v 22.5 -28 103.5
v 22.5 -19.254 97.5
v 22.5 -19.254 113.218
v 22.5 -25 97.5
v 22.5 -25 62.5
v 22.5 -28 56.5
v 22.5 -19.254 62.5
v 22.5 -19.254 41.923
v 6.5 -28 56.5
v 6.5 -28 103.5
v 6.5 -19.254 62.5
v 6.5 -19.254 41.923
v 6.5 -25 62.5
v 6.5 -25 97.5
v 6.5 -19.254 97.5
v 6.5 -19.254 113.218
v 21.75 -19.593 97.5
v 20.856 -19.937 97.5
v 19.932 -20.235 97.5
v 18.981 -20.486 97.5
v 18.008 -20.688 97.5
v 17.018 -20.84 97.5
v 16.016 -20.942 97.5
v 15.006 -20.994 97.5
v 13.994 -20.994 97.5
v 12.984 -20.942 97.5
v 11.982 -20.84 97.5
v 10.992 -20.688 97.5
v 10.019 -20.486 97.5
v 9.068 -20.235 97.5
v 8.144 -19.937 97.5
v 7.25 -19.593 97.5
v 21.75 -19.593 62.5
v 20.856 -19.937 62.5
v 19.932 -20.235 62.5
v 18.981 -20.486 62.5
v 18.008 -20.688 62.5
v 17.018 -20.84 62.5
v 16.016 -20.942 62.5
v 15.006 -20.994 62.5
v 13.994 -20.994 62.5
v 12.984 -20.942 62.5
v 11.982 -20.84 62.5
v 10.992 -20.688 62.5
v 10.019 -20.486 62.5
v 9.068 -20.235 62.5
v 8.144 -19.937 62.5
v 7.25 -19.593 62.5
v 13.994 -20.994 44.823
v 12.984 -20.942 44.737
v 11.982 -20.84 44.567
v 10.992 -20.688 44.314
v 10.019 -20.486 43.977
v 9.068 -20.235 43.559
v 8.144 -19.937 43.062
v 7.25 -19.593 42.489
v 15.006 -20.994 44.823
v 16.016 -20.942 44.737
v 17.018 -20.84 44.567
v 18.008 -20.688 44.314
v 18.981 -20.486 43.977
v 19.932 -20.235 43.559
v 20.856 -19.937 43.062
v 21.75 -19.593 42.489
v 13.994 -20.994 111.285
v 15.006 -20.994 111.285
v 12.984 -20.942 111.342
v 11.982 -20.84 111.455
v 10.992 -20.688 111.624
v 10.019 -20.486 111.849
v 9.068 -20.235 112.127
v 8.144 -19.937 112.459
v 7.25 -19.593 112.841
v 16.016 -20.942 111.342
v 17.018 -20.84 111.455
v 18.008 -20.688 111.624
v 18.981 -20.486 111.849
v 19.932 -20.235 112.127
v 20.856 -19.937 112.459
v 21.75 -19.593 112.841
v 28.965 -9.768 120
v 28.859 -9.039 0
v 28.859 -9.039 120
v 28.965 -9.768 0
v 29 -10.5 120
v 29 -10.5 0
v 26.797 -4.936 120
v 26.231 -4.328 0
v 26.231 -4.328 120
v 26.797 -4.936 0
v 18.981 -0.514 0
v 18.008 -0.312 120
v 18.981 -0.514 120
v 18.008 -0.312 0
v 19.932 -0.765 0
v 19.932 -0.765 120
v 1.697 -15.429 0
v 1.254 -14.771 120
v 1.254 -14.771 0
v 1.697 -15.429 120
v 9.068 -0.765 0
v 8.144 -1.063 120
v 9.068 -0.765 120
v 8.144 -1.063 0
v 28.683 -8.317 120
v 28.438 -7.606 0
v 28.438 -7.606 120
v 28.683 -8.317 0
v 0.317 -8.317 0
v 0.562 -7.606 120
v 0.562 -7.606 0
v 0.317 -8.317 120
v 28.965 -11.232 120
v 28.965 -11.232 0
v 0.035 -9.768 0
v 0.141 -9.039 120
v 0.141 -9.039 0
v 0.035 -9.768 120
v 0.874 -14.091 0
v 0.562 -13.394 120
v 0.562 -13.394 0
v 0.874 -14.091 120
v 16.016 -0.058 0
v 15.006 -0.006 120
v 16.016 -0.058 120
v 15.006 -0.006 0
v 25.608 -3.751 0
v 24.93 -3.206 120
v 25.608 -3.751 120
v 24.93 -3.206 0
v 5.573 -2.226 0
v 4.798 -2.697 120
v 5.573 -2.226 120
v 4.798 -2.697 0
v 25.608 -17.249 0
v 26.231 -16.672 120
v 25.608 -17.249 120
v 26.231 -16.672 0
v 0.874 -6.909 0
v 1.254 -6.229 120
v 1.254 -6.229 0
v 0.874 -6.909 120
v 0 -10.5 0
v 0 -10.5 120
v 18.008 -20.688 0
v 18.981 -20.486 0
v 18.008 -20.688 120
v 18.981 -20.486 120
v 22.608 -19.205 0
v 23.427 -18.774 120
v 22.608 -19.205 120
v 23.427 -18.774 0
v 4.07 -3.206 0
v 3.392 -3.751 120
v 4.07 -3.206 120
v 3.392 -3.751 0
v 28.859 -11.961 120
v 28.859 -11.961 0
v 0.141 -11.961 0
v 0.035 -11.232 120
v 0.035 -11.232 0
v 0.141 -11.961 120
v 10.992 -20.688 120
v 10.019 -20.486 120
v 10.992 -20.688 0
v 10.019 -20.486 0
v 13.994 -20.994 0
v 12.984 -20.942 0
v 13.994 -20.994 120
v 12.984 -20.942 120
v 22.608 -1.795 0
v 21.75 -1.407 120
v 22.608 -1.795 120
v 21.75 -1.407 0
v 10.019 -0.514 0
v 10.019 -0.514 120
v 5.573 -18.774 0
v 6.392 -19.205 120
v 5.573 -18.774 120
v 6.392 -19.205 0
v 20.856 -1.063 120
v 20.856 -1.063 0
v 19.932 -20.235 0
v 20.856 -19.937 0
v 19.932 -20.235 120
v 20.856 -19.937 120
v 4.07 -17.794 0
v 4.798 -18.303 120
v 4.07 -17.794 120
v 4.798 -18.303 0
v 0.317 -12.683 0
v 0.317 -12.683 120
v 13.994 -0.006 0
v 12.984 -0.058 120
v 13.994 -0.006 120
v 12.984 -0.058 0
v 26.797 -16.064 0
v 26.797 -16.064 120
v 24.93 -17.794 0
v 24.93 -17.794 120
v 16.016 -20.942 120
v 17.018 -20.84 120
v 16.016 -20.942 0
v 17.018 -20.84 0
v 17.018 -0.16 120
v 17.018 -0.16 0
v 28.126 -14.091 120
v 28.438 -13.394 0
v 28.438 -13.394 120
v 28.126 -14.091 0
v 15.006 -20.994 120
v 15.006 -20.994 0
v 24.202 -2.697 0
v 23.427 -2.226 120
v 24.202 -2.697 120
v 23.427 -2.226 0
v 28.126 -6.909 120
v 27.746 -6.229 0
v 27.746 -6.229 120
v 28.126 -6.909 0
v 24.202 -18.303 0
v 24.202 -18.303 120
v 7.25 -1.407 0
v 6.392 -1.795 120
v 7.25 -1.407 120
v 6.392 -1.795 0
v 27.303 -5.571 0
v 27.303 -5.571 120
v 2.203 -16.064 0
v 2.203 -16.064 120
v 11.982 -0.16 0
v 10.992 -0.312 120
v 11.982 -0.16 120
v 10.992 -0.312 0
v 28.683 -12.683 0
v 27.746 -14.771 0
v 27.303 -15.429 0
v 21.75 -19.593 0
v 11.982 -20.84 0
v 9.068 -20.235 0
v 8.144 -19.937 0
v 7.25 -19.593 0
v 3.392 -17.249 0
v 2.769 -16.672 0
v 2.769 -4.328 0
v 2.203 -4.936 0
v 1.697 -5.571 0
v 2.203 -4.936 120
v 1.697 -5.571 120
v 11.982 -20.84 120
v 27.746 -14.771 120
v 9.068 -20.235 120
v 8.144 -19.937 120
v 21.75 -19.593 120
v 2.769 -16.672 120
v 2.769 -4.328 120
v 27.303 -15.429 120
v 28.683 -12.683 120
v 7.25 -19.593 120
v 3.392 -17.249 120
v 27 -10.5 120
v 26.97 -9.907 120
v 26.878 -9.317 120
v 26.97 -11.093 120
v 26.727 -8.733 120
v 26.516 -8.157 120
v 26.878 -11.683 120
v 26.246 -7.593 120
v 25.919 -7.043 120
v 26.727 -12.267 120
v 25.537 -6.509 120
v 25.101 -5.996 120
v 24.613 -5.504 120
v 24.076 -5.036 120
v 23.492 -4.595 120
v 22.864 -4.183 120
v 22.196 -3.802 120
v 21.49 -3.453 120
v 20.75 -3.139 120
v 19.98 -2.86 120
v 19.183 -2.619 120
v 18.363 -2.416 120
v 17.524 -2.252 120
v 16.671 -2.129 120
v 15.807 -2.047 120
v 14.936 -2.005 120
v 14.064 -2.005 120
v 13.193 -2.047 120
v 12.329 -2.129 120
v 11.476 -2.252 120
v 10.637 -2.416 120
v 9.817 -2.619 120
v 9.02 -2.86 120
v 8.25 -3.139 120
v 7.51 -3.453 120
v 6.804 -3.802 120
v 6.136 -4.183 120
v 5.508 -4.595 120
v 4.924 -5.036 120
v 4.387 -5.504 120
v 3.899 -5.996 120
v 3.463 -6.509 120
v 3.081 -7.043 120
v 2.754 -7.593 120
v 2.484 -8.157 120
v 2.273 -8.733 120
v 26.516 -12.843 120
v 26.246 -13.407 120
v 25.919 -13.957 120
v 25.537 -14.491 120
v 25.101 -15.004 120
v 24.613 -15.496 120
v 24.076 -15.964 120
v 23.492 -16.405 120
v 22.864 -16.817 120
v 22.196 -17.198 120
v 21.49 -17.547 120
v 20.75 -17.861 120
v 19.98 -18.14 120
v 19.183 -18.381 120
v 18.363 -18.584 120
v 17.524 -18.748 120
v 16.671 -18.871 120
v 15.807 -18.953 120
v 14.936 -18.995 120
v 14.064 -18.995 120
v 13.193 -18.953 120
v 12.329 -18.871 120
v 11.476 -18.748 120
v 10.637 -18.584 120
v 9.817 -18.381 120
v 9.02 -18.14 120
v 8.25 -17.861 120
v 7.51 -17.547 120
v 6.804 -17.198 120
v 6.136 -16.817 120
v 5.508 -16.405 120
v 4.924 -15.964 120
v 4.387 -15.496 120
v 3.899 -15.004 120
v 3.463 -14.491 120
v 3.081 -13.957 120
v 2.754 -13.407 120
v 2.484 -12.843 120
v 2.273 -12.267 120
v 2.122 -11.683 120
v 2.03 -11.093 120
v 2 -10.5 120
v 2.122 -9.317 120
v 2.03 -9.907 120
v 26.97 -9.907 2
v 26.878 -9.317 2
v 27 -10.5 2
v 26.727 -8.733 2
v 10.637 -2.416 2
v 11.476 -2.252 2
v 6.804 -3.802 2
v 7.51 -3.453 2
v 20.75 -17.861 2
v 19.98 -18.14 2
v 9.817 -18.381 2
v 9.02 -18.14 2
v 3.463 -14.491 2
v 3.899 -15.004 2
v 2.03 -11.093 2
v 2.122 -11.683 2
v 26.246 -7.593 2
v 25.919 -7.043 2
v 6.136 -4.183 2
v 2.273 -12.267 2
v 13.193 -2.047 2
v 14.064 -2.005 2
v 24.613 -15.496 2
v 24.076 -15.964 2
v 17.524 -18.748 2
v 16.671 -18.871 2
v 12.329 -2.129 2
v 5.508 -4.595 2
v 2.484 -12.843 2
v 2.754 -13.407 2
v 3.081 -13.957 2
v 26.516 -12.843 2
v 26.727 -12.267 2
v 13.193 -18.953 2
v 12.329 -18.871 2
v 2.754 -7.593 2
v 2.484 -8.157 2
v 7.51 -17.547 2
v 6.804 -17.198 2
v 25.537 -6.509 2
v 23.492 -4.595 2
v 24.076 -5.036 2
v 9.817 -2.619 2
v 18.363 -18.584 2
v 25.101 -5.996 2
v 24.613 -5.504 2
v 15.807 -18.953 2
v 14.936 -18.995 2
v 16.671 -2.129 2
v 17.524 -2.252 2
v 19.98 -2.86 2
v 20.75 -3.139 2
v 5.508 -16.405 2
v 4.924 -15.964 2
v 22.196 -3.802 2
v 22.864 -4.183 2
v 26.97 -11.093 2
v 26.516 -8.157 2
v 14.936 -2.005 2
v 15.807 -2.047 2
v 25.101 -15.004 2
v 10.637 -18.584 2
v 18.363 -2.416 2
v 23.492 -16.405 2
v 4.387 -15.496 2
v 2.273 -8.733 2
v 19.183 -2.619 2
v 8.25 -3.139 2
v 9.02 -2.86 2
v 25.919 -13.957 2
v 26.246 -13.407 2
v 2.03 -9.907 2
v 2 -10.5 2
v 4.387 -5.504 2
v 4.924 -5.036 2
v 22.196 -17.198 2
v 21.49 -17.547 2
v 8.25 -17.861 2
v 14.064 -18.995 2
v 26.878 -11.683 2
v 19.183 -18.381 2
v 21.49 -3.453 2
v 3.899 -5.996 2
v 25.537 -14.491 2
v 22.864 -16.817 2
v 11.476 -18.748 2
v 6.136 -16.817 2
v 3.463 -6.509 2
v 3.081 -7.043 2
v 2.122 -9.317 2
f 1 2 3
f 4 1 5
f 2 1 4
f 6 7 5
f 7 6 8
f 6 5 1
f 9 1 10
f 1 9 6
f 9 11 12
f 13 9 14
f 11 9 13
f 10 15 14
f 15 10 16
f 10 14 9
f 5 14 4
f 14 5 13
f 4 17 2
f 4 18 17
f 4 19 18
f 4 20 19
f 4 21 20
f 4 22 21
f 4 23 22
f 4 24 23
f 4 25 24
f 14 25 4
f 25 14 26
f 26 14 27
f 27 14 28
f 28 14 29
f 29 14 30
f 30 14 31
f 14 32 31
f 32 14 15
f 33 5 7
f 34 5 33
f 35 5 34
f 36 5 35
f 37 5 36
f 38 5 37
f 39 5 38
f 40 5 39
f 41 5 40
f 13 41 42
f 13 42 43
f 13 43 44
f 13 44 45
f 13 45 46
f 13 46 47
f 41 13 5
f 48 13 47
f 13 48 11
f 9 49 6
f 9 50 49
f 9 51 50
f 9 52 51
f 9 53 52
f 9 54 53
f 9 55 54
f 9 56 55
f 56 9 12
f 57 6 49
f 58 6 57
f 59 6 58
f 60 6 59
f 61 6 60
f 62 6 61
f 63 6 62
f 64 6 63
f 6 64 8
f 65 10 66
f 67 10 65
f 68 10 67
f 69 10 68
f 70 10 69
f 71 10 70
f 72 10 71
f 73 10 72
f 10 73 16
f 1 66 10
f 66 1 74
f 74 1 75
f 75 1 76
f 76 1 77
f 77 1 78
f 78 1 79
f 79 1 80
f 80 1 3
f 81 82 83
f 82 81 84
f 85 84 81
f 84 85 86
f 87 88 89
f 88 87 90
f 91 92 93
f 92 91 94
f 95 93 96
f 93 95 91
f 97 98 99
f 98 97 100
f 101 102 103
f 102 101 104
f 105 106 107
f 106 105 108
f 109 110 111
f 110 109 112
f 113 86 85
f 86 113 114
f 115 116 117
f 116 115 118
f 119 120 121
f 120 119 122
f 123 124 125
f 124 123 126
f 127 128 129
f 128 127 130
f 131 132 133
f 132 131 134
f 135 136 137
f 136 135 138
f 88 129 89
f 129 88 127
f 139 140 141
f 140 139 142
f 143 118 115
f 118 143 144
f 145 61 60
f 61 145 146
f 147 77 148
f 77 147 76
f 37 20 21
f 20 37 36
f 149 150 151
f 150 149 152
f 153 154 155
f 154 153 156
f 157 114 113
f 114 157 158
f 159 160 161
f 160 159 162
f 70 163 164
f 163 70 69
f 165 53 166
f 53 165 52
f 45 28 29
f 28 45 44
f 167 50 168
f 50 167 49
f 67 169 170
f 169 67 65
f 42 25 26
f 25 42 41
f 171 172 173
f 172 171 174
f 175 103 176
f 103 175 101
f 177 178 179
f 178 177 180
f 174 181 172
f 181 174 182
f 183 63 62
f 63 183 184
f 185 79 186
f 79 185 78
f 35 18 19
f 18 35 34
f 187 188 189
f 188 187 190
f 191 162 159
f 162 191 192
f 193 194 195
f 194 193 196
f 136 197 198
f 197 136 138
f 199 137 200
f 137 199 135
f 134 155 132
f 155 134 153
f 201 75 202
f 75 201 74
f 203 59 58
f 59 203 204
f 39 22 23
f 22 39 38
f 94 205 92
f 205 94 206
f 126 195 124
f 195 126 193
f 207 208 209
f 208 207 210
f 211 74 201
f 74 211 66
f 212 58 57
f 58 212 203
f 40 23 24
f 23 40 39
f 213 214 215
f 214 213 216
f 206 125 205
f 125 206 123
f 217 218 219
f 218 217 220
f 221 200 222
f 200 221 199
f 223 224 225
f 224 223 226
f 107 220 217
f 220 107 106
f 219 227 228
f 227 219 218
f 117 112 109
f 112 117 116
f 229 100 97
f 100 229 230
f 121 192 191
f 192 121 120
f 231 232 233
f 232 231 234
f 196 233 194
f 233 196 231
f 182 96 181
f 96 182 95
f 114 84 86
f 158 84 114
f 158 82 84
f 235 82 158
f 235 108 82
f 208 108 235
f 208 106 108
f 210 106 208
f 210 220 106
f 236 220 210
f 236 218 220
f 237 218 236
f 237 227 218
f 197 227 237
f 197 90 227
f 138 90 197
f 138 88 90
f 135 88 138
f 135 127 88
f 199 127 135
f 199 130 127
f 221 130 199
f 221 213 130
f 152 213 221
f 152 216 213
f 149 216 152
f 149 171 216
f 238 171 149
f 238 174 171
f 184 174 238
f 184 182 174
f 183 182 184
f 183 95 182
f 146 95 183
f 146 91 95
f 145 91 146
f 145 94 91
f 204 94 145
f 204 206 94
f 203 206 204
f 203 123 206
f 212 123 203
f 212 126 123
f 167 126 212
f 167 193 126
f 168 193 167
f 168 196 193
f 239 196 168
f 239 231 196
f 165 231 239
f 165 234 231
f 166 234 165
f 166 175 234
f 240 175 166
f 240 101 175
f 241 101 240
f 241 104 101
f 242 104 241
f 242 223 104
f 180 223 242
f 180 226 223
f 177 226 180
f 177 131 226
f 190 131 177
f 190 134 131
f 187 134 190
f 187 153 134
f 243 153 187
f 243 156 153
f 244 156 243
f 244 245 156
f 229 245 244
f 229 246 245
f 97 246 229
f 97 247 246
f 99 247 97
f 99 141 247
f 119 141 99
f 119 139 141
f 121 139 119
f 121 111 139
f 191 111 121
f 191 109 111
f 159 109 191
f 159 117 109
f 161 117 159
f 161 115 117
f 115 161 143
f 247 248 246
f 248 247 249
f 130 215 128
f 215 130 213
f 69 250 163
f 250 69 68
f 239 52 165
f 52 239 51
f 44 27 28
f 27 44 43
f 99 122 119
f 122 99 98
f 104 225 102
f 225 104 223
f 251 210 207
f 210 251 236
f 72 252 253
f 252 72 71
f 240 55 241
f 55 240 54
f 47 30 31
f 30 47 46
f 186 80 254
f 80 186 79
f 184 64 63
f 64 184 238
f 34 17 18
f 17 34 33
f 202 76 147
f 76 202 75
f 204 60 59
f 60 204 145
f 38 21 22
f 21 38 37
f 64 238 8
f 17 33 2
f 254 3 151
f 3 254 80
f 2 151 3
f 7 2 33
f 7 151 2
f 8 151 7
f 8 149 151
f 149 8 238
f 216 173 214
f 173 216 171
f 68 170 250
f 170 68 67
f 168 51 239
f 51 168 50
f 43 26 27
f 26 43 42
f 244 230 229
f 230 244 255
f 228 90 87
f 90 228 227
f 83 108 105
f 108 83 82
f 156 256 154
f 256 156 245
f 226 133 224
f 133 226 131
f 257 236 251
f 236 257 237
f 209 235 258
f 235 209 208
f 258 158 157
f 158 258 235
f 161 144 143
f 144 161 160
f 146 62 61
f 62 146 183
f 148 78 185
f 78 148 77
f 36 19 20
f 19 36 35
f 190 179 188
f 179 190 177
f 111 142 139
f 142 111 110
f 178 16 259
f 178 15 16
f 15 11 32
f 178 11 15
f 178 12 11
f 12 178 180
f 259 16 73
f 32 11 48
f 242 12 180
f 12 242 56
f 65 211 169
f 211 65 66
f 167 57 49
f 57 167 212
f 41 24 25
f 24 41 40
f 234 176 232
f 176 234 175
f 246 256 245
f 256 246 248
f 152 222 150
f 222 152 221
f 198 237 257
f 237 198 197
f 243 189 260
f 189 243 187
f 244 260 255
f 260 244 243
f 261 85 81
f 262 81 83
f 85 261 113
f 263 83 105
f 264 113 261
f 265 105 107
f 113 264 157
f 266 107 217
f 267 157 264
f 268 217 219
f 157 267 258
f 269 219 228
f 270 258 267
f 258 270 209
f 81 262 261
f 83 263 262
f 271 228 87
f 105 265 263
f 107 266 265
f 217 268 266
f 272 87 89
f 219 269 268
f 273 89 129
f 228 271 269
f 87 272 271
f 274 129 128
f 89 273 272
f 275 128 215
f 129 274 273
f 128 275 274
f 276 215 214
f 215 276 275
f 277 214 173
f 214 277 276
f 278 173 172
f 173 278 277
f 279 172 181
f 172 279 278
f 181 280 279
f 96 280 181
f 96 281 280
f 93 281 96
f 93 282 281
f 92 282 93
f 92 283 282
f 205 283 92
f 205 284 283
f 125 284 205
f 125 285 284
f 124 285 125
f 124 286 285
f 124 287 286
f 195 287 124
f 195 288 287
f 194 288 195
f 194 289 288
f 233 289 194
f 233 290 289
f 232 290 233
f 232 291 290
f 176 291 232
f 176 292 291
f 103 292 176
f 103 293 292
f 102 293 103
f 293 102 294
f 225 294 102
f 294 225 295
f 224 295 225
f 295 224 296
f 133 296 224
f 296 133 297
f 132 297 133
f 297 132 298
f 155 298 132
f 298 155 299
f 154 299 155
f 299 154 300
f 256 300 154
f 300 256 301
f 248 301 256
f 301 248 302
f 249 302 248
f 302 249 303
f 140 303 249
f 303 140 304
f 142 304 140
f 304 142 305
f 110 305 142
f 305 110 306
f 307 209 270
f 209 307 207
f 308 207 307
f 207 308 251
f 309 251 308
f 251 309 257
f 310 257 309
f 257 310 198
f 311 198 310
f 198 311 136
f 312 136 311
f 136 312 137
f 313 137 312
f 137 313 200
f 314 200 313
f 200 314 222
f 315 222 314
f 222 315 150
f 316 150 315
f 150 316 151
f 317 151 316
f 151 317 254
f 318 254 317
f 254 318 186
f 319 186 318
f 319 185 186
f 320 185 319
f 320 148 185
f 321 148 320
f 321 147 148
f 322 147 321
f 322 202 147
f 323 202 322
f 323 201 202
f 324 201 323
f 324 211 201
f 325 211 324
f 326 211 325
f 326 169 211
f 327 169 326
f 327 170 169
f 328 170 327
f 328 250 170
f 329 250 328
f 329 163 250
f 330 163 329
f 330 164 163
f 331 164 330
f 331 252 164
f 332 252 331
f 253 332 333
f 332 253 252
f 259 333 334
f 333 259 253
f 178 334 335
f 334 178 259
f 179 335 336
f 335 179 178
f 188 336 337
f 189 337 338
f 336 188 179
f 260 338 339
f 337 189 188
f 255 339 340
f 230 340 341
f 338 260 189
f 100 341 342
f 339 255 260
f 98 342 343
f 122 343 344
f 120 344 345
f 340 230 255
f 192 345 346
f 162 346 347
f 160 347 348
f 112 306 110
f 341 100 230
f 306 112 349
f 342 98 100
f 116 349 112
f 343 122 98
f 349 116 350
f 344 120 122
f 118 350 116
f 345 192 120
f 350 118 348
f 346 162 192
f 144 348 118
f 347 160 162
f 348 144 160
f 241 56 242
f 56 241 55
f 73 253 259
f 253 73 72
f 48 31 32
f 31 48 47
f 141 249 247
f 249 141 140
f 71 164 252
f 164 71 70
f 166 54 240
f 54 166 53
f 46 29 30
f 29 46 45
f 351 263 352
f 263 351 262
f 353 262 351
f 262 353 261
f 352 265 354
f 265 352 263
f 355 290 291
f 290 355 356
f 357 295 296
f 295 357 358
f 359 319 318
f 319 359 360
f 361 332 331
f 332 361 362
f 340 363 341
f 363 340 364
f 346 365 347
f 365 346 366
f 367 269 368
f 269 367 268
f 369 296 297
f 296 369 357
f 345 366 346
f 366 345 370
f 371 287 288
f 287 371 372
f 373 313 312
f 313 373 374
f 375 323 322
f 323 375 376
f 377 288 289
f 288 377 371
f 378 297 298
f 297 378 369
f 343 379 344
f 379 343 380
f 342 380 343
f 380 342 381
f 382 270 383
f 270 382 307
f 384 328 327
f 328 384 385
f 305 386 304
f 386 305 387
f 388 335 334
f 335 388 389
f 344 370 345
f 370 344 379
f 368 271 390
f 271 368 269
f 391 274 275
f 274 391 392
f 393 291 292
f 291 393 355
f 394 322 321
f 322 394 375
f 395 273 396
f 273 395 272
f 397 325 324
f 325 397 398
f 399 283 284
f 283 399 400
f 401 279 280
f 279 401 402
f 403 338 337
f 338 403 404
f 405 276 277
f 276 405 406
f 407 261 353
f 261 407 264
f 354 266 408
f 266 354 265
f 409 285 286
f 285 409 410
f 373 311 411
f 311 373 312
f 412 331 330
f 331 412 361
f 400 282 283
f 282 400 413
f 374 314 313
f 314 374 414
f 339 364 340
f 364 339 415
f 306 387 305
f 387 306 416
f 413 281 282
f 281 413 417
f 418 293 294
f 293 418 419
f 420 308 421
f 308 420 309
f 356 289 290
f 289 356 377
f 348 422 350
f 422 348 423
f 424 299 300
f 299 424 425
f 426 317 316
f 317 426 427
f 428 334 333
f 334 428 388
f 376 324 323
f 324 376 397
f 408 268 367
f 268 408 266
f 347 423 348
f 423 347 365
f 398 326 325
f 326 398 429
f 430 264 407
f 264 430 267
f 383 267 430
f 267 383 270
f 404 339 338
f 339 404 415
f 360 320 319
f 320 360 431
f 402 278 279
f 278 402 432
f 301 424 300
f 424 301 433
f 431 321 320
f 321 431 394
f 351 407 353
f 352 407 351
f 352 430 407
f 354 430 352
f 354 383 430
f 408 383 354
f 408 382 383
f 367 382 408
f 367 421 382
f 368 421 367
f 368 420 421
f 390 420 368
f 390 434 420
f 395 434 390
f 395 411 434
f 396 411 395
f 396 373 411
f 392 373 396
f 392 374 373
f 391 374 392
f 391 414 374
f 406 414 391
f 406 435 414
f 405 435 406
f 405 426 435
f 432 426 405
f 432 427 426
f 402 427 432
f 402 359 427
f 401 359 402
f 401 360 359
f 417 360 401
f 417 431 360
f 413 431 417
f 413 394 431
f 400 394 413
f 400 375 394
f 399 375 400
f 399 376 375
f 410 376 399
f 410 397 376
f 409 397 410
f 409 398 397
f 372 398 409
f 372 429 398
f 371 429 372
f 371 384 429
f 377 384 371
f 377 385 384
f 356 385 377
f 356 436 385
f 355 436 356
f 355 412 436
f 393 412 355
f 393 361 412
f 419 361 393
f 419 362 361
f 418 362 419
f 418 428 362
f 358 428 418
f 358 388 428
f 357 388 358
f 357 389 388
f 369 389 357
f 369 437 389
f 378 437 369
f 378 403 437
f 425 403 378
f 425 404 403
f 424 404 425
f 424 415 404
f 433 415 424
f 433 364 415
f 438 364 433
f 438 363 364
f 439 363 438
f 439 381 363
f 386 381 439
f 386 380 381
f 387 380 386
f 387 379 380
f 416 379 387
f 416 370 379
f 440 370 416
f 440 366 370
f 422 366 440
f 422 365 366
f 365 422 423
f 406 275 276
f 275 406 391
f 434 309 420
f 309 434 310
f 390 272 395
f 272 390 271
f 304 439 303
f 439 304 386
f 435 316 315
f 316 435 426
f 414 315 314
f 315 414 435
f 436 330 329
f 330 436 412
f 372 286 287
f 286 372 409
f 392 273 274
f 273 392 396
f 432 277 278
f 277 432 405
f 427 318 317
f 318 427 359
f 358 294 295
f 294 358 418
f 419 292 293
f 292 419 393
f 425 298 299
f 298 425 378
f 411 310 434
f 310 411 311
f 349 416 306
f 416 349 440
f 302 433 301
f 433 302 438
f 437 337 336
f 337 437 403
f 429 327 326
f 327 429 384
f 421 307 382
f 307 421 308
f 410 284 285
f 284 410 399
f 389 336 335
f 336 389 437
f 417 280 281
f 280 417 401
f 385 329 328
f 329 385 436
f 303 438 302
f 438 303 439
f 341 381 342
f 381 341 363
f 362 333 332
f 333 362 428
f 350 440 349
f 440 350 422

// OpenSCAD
Shell=2;
//Fineness of the curves
$fn=90;
//heigth
PYD=120;
//cavity length (add 2mm for tolerance)
QXD=25; //
//cavity width (add 2mm for tolerance)
QYD=17;
//belt holder width
BXD=16;
//belt width - inner height of the holder
BYD=35; 
//gap for the belt (a part disappears in the rounding)
BZD=6; 


rotate([90,0,0]){ //suggested print orientation (no need for support)
difference(){
    //quiver
    union(){
        translate([Shell+QXD/2,0,QYD/2+Shell])
        rotate([-90,0,0])
        scale([(QXD+2*Shell)/(QYD+2*Shell),1,1])
        cylinder(h=PYD,d=QYD+2*Shell);
        //belt holder
        BT=3; //thickness
        translate([(QXD+2*Shell)/2-(BXD/2),PYD*2/3-(BYD+6*Shell)/2,QYD+Shell]){
            difference(){
                cube([BXD,BYD+6*Shell,BZD+BT]);
                translate([-1,3*Shell,0])
                cube([BXD+2,BYD,BZD]);
            }
            translate([BXD,-15,0])
            rotate([0,0,90])
            keil(15,BXD,BZD+BT);
            translate([0,BYD+6*Shell+10,0])
            rotate([0,0,-90])
            keil(10,BXD,BZD+BT);
        }
    }

    //quiver cavity
    translate([Shell+QXD/2,Shell,QYD/2+Shell])
    rotate([-90,0,0])
    scale([QXD/QYD,1,1])
    cylinder(h=PYD+Shell,d=QYD);
}

} //end rotate print orientation

module keil(xd,yd,zd){
    translate([0,yd,0])
    rotate([90,0,0])
    linear_extrude(height = yd)
    polygon(points=[[0,0],[xd,0],[xd,zd]]);
}
